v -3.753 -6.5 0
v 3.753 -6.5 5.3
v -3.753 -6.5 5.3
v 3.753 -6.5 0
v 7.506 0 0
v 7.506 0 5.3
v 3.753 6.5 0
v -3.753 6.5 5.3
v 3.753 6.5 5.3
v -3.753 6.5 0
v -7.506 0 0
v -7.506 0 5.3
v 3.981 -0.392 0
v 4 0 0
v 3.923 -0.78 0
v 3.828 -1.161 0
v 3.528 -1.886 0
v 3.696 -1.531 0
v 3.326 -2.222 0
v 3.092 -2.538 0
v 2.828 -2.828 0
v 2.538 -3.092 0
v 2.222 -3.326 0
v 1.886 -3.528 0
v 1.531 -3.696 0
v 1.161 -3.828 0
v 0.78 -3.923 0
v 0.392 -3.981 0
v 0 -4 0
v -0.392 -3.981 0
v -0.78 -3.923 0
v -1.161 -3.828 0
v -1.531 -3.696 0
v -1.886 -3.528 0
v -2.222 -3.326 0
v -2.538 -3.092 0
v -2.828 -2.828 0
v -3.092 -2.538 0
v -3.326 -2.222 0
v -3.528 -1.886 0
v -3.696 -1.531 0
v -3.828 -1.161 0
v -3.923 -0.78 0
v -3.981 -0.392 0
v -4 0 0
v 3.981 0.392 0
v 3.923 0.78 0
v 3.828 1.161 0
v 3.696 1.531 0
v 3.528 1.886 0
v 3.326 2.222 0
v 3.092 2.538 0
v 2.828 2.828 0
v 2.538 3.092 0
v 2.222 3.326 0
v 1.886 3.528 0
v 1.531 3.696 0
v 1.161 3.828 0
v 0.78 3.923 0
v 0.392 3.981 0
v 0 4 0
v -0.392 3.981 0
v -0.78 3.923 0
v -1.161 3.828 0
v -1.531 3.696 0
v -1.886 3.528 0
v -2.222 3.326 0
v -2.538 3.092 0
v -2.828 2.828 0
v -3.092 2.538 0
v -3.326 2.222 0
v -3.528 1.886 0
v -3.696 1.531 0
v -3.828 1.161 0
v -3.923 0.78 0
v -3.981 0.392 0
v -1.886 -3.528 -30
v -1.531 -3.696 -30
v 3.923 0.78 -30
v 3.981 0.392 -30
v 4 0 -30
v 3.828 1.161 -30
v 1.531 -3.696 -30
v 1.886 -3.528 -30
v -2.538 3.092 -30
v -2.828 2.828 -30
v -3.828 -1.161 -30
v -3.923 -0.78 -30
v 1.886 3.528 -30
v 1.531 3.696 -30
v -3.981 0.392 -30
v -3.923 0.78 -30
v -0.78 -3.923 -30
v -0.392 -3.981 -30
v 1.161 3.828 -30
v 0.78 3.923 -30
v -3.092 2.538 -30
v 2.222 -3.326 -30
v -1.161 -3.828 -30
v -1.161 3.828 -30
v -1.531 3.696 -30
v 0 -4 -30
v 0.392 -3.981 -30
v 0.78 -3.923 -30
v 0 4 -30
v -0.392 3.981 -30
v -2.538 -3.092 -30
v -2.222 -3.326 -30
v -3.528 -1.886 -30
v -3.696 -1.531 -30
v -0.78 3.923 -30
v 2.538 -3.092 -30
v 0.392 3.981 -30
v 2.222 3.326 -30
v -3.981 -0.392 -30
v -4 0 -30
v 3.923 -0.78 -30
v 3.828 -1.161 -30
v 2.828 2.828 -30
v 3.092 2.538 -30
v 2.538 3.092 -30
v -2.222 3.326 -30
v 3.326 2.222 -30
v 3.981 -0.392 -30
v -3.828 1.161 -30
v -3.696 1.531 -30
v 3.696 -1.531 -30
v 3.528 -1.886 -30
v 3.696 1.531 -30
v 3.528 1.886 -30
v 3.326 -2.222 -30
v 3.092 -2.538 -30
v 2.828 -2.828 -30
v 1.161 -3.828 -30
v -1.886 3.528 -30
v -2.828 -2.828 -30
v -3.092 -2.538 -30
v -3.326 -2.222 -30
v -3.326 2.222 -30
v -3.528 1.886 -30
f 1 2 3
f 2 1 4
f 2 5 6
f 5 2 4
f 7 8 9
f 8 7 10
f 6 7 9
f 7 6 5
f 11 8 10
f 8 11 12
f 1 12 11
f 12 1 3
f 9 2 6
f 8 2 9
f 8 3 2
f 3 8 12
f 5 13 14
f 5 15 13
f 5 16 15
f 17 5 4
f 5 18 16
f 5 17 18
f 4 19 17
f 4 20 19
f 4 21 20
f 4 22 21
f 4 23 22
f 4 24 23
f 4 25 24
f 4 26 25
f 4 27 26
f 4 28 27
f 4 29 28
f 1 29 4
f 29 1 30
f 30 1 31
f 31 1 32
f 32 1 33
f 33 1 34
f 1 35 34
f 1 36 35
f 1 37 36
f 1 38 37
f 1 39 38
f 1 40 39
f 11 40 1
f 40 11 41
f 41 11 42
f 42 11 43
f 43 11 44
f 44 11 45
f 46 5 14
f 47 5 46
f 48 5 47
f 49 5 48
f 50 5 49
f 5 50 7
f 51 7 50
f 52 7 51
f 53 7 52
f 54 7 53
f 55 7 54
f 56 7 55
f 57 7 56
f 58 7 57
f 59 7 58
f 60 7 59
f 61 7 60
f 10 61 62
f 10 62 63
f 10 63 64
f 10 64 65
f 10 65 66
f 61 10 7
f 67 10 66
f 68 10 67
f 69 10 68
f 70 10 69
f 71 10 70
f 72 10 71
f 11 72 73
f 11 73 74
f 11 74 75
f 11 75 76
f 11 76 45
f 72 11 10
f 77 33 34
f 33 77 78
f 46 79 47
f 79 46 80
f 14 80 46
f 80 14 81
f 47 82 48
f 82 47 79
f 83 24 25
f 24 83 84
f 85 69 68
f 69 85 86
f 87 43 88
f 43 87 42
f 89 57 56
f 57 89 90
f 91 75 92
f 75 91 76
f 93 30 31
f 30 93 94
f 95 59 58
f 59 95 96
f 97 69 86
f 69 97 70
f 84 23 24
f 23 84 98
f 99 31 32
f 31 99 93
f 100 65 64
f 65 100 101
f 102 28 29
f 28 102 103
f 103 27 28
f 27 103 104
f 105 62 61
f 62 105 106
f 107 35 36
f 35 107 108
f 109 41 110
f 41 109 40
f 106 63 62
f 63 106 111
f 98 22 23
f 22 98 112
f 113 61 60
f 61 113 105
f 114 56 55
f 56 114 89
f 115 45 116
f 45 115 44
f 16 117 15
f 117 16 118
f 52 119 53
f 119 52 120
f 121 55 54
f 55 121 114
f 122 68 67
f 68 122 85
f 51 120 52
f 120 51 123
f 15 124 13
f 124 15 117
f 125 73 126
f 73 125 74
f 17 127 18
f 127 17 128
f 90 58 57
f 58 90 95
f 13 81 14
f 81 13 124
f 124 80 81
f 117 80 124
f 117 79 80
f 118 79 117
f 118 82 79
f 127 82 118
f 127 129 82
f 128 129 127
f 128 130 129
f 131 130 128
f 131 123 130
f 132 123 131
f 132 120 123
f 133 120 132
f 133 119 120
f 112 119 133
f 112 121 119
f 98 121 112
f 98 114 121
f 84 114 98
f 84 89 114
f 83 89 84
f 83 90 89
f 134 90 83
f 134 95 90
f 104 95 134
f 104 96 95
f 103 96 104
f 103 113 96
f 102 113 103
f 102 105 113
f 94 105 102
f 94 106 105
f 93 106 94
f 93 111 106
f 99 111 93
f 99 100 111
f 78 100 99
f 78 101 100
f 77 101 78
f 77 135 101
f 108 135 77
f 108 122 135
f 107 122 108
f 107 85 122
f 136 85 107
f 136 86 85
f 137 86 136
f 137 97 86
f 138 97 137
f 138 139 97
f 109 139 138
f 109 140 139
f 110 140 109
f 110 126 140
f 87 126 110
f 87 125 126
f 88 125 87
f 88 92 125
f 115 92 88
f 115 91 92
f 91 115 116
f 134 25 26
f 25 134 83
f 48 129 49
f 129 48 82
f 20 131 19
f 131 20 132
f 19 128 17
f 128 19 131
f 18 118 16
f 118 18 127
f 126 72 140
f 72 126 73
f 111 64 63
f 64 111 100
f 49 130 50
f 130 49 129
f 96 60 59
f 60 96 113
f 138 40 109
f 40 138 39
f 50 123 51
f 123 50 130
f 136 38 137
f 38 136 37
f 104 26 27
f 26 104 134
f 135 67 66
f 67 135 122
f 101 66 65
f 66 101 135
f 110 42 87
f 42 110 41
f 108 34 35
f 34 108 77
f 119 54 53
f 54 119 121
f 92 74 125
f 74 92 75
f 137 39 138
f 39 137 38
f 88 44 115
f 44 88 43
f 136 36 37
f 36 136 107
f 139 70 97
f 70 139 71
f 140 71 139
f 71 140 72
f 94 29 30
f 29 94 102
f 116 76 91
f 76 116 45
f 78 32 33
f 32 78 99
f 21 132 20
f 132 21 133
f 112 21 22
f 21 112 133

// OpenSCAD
// M8 六角ボルト (ねじ山なし)

// 頭部: 対辺距離 13mm、高さ 5.3mm
// cylinder(fn=6)のrは内接円半径(対辺距離の半分)を指定する
head_across_flats = 13;
head_height = 5.3;
shank_diameter = 8;
shank_length = 30;

// 頭部: z=0 から z=5.3 まで配置
cylinder(r = (head_across_flats / 2) / cos(180/6), h = head_height, $fn = 6);

// シャンク: z=0 から z=-30 まで配置
translate([0, 0, -shank_length])
cylinder(r = shank_diameter / 2, h = shank_length, $fn = 64);
